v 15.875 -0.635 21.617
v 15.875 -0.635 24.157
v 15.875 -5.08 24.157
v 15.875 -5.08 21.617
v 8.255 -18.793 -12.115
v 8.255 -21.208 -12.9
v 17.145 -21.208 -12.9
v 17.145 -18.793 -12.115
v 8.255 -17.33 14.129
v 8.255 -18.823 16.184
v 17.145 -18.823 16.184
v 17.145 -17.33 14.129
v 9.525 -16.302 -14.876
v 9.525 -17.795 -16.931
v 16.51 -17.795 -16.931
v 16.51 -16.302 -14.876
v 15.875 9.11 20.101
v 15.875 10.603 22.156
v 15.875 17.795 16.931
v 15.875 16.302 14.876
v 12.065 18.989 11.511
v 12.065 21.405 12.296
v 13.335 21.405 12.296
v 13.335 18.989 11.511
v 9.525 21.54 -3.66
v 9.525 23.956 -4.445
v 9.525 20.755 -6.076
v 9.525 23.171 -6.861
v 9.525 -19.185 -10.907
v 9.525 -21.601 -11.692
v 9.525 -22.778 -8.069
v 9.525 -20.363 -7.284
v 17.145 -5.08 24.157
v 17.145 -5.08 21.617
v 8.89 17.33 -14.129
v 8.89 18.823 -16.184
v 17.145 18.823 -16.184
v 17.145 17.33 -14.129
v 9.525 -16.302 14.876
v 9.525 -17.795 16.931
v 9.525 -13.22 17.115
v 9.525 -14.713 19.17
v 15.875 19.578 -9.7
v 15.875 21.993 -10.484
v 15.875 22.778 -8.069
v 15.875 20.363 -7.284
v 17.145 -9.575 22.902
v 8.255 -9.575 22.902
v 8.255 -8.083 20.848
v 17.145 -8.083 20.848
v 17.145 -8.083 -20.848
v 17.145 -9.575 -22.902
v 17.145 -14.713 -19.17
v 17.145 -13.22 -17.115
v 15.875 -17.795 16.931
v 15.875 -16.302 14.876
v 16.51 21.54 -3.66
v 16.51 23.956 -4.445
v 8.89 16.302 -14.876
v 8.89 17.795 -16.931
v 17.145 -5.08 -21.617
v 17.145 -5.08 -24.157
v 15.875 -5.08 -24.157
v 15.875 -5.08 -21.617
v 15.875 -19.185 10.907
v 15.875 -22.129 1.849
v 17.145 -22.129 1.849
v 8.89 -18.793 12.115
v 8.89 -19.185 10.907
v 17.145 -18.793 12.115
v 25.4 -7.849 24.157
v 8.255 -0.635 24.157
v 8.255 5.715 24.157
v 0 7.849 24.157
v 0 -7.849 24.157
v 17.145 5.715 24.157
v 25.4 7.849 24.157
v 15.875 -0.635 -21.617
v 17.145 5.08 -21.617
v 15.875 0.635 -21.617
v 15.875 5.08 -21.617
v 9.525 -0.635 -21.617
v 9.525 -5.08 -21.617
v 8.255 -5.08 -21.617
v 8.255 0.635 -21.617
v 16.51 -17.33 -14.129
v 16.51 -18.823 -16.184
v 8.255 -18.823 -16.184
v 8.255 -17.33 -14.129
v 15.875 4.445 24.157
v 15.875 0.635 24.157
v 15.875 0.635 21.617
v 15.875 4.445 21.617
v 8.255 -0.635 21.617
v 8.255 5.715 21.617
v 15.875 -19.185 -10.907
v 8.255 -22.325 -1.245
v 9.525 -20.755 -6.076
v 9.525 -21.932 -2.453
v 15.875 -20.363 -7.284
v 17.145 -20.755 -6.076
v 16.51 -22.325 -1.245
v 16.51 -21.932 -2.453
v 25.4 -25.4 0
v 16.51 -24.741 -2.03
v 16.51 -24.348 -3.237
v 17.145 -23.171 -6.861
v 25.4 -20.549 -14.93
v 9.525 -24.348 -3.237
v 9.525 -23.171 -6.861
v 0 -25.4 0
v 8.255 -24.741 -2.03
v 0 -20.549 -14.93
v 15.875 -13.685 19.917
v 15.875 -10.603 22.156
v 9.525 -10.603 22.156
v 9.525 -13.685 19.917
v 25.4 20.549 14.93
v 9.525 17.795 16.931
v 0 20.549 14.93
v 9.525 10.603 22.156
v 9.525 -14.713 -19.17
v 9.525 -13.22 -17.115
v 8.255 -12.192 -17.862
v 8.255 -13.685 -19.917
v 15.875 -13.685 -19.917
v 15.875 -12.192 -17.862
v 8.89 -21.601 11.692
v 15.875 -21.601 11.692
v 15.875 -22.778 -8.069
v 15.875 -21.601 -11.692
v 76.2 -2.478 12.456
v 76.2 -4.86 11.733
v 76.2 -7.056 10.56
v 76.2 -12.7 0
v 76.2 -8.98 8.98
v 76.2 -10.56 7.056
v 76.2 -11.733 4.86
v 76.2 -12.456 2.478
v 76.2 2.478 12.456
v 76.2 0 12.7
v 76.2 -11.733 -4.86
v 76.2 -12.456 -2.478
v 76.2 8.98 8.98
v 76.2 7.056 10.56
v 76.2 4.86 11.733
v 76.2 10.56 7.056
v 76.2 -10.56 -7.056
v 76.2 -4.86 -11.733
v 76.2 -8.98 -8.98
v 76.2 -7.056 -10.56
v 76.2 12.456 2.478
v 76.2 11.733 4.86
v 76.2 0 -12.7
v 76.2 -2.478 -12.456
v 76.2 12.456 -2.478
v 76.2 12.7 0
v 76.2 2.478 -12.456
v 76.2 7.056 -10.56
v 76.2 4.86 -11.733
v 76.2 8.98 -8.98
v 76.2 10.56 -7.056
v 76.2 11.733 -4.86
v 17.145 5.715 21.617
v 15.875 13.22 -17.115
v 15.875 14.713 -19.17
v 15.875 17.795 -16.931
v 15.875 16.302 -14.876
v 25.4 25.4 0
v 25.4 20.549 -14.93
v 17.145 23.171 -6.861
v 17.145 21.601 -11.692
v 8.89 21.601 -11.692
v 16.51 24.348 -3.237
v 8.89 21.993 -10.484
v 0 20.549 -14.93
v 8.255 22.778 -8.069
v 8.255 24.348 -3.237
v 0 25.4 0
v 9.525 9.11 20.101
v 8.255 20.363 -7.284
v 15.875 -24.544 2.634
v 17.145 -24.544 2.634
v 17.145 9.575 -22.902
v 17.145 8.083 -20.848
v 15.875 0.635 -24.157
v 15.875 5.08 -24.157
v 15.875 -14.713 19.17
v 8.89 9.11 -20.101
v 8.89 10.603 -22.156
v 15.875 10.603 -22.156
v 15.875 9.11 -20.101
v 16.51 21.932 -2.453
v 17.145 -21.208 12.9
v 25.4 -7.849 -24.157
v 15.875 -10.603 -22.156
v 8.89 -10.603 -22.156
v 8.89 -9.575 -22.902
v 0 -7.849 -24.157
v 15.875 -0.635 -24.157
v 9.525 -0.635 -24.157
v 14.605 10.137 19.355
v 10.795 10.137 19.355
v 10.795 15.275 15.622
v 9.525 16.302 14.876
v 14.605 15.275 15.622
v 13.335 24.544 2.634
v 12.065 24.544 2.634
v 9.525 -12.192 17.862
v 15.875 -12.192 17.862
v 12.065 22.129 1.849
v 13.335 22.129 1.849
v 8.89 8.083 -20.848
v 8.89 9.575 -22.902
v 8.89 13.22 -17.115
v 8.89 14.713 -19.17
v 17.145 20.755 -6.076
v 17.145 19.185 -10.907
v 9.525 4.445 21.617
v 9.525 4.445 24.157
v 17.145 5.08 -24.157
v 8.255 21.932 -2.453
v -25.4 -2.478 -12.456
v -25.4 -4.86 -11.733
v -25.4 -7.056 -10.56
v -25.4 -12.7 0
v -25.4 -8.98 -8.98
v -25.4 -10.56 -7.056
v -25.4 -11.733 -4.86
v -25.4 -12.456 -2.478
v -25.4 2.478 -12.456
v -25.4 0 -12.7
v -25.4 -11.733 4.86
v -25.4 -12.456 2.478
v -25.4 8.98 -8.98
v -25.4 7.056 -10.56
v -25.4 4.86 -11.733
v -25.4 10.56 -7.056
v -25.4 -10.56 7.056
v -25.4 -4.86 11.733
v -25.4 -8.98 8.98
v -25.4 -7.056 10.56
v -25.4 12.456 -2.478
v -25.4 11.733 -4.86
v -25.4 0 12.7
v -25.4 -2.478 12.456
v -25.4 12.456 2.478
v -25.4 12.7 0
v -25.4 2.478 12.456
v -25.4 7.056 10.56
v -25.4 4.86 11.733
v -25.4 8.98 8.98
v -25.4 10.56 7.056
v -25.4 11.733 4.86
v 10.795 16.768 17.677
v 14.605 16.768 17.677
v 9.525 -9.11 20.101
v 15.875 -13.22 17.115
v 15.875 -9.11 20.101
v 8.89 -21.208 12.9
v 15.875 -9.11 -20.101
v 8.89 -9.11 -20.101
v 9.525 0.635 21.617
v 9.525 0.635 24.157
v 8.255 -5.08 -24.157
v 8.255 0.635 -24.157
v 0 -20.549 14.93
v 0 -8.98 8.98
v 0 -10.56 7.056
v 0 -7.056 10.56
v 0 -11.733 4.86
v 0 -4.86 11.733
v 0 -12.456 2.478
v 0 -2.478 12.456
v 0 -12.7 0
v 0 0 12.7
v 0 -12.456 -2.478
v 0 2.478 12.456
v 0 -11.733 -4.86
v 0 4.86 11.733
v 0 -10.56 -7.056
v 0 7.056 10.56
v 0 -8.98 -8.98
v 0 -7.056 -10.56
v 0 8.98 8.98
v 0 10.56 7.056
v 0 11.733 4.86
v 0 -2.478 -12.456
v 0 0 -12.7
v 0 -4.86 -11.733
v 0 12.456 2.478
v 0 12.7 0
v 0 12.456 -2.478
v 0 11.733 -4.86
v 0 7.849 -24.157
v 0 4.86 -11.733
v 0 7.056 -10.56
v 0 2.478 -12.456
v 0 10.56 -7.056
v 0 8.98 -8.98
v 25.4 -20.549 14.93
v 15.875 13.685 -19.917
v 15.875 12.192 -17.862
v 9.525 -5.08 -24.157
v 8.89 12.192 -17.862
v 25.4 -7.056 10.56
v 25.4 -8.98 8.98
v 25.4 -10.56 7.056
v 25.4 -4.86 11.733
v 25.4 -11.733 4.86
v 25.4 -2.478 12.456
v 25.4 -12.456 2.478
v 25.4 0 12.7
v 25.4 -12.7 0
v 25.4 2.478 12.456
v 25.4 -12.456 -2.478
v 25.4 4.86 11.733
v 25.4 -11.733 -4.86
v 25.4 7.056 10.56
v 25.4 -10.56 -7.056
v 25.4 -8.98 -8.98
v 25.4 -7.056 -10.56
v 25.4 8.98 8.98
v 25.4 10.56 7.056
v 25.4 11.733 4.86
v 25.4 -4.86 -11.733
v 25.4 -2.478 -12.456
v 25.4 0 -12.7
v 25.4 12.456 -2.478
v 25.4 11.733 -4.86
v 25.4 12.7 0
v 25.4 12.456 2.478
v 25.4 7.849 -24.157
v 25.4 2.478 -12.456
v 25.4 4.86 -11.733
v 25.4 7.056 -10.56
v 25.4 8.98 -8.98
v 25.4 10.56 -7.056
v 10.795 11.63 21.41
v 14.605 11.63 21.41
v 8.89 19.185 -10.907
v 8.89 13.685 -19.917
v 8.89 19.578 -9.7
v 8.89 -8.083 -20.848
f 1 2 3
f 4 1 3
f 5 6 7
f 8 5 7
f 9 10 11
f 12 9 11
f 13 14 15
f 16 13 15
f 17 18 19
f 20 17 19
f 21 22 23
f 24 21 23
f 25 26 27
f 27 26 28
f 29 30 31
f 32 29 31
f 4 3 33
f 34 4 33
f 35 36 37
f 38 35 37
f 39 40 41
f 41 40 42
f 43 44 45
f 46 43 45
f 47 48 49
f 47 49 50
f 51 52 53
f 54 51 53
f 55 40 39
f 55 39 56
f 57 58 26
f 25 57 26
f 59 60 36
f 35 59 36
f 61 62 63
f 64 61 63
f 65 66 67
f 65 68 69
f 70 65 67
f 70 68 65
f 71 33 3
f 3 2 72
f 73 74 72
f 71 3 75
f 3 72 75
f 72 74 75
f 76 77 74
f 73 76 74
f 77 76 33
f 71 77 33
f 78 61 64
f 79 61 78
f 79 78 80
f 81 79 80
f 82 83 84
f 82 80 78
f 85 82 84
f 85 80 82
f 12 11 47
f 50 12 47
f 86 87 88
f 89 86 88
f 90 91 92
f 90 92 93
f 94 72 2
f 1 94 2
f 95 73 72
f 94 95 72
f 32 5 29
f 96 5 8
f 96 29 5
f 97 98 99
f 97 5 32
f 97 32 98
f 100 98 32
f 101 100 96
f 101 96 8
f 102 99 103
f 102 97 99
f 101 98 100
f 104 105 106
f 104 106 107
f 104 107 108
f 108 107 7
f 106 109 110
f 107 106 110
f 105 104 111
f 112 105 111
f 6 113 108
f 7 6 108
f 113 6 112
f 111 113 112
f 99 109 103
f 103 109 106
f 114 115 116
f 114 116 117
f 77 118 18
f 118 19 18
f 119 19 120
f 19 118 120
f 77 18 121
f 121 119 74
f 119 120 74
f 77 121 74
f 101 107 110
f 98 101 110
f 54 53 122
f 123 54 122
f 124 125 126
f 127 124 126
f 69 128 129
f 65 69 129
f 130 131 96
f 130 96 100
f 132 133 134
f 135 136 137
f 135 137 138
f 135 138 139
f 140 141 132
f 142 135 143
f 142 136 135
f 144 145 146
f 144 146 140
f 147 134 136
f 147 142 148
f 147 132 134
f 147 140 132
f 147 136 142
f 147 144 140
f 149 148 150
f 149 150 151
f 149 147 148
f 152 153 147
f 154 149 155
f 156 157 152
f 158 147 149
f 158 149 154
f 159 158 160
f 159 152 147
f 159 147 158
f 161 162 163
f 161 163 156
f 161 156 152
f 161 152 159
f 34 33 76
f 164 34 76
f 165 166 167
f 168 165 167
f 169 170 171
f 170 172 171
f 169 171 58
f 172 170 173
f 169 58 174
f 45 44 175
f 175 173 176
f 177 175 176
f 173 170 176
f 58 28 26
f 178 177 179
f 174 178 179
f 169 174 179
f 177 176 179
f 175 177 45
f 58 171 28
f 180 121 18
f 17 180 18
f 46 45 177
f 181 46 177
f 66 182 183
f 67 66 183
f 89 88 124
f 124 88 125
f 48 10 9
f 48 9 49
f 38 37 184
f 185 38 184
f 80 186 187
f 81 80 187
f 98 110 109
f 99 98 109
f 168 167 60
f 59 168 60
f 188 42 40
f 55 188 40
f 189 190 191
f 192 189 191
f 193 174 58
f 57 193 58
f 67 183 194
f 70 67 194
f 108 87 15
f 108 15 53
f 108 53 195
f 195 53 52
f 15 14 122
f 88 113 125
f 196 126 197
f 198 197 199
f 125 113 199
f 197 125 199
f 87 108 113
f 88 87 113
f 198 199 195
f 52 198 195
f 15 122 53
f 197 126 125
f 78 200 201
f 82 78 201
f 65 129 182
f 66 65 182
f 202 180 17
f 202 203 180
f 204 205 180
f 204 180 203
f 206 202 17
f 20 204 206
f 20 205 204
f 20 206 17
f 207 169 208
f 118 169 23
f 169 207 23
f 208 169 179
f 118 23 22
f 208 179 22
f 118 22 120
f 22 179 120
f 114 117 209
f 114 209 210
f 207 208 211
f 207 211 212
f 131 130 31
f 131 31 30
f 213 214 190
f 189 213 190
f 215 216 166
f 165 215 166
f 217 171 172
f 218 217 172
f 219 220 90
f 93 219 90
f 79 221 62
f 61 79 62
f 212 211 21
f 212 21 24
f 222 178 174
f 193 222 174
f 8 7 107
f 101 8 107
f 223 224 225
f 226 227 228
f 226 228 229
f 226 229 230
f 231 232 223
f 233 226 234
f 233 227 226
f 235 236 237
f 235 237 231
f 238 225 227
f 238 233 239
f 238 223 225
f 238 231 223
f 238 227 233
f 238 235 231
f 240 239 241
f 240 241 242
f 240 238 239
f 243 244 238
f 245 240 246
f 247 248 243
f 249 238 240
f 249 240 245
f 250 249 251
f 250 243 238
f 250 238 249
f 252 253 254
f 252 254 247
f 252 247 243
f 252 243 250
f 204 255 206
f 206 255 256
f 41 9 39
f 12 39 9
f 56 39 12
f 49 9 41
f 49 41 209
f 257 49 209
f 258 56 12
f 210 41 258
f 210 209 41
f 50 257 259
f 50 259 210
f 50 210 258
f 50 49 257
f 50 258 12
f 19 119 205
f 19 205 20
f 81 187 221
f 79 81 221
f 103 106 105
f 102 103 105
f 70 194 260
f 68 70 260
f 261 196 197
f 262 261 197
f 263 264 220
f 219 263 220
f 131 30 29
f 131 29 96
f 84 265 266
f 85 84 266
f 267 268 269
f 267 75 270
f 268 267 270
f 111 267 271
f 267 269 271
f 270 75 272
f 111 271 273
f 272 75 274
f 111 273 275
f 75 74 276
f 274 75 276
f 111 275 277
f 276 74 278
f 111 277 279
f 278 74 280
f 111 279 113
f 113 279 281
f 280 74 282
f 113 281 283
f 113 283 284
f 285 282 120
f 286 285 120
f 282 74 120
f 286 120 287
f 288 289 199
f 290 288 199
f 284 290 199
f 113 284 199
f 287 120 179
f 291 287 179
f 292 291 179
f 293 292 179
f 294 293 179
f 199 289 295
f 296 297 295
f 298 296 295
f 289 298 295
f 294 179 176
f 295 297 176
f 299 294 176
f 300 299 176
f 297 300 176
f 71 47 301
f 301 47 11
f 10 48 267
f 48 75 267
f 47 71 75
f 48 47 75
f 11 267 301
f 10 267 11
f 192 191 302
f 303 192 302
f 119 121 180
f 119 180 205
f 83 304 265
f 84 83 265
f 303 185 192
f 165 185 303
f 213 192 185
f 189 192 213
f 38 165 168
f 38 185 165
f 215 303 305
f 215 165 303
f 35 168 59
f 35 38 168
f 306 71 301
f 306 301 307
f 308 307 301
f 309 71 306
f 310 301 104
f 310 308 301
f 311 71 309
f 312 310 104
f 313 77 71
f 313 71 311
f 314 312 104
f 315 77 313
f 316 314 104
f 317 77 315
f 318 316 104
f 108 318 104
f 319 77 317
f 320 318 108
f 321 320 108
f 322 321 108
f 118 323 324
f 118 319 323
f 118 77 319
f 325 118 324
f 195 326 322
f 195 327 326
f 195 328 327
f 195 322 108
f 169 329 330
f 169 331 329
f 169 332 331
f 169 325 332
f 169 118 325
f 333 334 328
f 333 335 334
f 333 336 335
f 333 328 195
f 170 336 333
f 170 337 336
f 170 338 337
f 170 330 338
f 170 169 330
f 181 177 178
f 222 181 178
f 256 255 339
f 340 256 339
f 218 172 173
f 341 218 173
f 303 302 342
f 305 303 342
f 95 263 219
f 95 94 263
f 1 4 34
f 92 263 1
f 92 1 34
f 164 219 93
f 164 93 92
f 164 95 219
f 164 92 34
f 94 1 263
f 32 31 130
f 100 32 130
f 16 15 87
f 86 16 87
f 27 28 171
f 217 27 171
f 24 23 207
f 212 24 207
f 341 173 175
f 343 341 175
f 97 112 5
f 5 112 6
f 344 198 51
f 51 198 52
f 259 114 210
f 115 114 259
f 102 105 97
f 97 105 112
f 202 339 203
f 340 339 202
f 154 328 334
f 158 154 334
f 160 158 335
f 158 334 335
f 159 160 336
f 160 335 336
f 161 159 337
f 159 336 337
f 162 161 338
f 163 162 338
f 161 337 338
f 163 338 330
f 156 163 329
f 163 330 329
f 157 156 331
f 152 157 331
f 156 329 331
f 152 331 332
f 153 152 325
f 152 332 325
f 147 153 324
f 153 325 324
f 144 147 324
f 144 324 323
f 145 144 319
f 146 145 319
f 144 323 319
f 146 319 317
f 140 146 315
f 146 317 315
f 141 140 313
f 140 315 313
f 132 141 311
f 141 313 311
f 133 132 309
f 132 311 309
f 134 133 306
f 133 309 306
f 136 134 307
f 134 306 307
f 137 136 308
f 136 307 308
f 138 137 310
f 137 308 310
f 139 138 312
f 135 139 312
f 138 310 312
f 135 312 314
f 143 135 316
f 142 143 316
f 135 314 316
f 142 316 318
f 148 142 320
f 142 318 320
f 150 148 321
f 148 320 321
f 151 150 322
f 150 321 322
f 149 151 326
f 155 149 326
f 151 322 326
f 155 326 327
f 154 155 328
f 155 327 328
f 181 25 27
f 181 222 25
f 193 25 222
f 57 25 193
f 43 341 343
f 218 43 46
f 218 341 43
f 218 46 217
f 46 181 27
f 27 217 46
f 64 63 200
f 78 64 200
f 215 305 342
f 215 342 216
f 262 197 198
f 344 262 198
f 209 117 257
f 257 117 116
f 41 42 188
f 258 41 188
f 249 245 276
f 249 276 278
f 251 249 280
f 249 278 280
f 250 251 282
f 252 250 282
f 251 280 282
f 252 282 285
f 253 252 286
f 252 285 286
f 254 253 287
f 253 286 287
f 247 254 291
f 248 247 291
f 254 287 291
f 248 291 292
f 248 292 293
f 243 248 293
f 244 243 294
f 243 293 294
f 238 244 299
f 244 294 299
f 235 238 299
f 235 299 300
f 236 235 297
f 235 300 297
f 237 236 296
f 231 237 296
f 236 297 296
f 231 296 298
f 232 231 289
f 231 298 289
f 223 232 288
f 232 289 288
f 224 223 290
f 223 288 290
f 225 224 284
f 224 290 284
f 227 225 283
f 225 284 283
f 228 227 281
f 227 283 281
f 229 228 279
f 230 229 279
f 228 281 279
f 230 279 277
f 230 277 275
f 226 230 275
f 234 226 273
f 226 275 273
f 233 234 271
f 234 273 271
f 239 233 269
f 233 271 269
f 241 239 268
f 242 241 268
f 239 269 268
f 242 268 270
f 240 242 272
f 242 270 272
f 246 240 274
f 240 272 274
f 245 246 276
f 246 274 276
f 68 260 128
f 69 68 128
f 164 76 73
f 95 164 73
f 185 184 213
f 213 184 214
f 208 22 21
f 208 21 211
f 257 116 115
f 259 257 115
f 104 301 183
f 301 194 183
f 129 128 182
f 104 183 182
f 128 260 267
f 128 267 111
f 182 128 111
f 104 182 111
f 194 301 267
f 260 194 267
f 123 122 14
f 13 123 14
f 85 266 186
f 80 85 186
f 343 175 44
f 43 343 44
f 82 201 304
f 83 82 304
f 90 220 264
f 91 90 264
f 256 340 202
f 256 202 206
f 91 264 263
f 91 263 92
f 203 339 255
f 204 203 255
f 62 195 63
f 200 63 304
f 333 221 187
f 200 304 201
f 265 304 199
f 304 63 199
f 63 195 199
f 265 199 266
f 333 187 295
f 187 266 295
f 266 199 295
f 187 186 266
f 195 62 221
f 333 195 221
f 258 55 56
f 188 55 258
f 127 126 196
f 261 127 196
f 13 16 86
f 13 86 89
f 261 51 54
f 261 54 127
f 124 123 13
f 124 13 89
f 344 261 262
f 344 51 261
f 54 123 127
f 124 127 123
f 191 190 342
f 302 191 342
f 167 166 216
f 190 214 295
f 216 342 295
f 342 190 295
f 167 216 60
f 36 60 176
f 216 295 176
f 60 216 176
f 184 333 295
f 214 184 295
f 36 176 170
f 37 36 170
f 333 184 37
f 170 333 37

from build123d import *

# Parameters (mm, degrees)
BOSS_EXTRUDE1_DEPTH      = 25.4
SKETCH2_R                = 12.7
BOSS_EXTRUDE2_DEPTH      = 50.8
SKETCH3_R                = 12.7
BOSS_EXTRUDE3_DEPTH      = 25.4
SKETCH4_W                = 6.35
SKETCH4_H                = 8.89
SKETCH4_W_2              = 3.81
SKETCH4_H_2              = 6.35
CUT_EXTRUDE1_DEPTH       = 2.54
SKETCH5_W                = 1.27
SKETCH5_H                = 10.16
CUT_EXTRUDE2_DEPTH       = 2.54
CUT_EXTRUDE3_DEPTH       = 2.54
CUT_EXTRUDE4_DEPTH       = 2.54
CUT_EXTRUDE5_DEPTH       = 2.54
CUT_EXTRUDE6_DEPTH       = 2.54
SKETCH11_W               = 6.35
SKETCH11_H               = 3.81
CUT_EXTRUDE7_DEPTH       = 8.464872704
CUT_EXTRUDE7_DEPTH_BACK  = 2.54
CUT_EXTRUDE8_DEPTH       = 2.54
SKETCH13_W               = 8.89
SKETCH13_H               = 11.43
SKETCH13_W_2             = 6.35
SKETCH13_H_2             = 3.81
CUT_EXTRUDE9_DEPTH       = 2.54
SKETCH14_W               = 6.35
SKETCH14_H               = 3.81
CUT_EXTRUDE10_DEPTH      = 1
CUT_EXTRUDE10_DEPTH_BACK = 2.54


with BuildPart() as part:
    # Sketch1 → Boss-Extrude1 (new body)
    with BuildSketch(Plane(origin=(0, 0, 0), x_dir=(0, 0, -1), z_dir=(1, 0, 0))):
        Polygon((0, 25.4), (-14.929745408, 20.549031657), (-24.156835514, 7.849031657), (-24.156835514, -7.849031657), (-14.929745408, -20.549031657), (0, -25.4), (14.929745408, -20.549031657), (24.156835514, -7.849031657), (24.156835514, 7.849031657), (14.929745408, 20.549031657), align=None)
    extrude(amount=BOSS_EXTRUDE1_DEPTH)

    # Sketch2 → Boss-Extrude2 (add)
    with BuildSketch(Plane(origin=(25.4, 0, 0), x_dir=(0, 0, -1), z_dir=(1, 0, 0))):
        Circle(SKETCH2_R)
    extrude(amount=BOSS_EXTRUDE2_DEPTH)

    # Sketch3 → Boss-Extrude3 (add)
    with BuildSketch(Plane.ZY):
        Circle(SKETCH3_R)
    extrude(amount=BOSS_EXTRUDE3_DEPTH)

    # Sketch4 → Cut-Extrude1 (cut)
    with BuildSketch(Plane(origin=(0, 14.199031657, 19.543290461), x_dir=(1, 0, 0), z_dir=(0, 0.587785252, 0.809016994))):
        with Locations((12.7, 0)):
            Rectangle(SKETCH4_W, SKETCH4_H)
        with Locations((12.7, 0)):
            Rectangle(SKETCH4_W_2, SKETCH4_H_2, mode=Mode.SUBTRACT)
    extrude(amount=-CUT_EXTRUDE1_DEPTH, mode=Mode.SUBTRACT)

    # Sketch5 → Cut-Extrude2 (cut)
    with BuildSketch(Plane(origin=(0, 22.974515829, 7.464872704), x_dir=(1, 0, 0), z_dir=(0, 0.951056516, 0.309016994))):
        with Locations((12.7, 0)):
            Rectangle(SKETCH5_W, SKETCH5_H)
    extrude(amount=-CUT_EXTRUDE2_DEPTH, mode=Mode.SUBTRACT)

    # Sketch6 → Cut-Extrude3 (cut)
    with BuildSketch(Plane(origin=(0, 22.974515829, -7.464872704), x_dir=(1, 0, 0), z_dir=(0, 0.951056516, -0.309016994))):
        Polygon((8.89, 3.175), (15.875, 3.175), (15.875, 0.635), (8.255, 0.635), (8.255, -4.445), (16.51, -4.445), (16.51, -3.175), (9.525, -3.175), (9.525, -0.635), (17.145, -0.635), (17.145, 4.445), (8.89, 4.445), align=None)
    extrude(amount=-CUT_EXTRUDE3_DEPTH, mode=Mode.SUBTRACT)

    # Sketch8 → Cut-Extrude4 (cut)
    with BuildSketch(Plane(origin=(0, 14.199031657, -19.543290461), x_dir=(-1, 0, 0), z_dir=(0, 0.587785252, -0.809016994))):
        Polygon((-8.89, -5.715), (-8.89, -4.445), (-15.875, -4.445), (-15.875, -0.635), (-8.89, -0.635), (-8.89, 0.635), (-15.875, 0.635), (-15.875, 4.445), (-8.89, 4.445), (-8.89, 5.715), (-17.145, 5.715), (-17.145, -5.715), align=None)
    extrude(amount=-CUT_EXTRUDE4_DEPTH, mode=Mode.SUBTRACT)

    # Sketch9 → Cut-Extrude5 (cut)
    with BuildSketch(Plane(origin=(0, 0, -24.156835514), x_dir=(-1, 0, 0), z_dir=(0, 0, -1))):
        Polygon((-9.525, -5.08), (-8.255, -5.08), (-8.255, 0.635), (-15.875, 0.635), (-15.875, 5.08), (-17.145, 5.08), (-17.145, -5.08), (-15.875, -5.08), (-15.875, -0.635), (-9.525, -0.635), align=None)
    extrude(amount=-CUT_EXTRUDE5_DEPTH, mode=Mode.SUBTRACT)

    # Sketch10 → Cut-Extrude6 (cut)
    with BuildSketch(Plane(origin=(0, -14.199031657, -19.543290461), x_dir=(-1, 0, 0), z_dir=(0, -0.587785252, -0.809016994))):
        Polygon((-8.89, 5.715), (-17.145, 5.715), (-17.145, -0.635), (-9.525, -0.635), (-9.525, -4.445), (-16.51, -4.445), (-16.51, -5.715), (-8.255, -5.715), (-8.255, 0.635), (-15.875, 0.635), (-15.875, 4.445), (-8.89, 4.445), align=None)
    extrude(amount=-CUT_EXTRUDE6_DEPTH, mode=Mode.SUBTRACT)

    # Sketch11 → Cut-Extrude7 (cut, two sides)
    with BuildSketch(Plane(origin=(0, -22.974515829, -7.464872704), x_dir=(1, 0, 0), z_dir=(0, -0.951056516, -0.309016994))) as cut_extrude7_sk:
        Polygon((17.145, 0.635), (9.525, 0.635), (9.525, 4.445), (16.51, 4.445), (16.51, 5.715), (8.255, 5.715), (8.255, -5.715), (17.145, -5.715), align=None)
        with Locations((12.7, -2.54)):
            Rectangle(SKETCH11_W, SKETCH11_H, mode=Mode.SUBTRACT)
    extrude(amount=CUT_EXTRUDE7_DEPTH, mode=Mode.SUBTRACT)
    extrude(cut_extrude7_sk.sketch, amount=-CUT_EXTRUDE7_DEPTH_BACK, mode=Mode.SUBTRACT)

    # Sketch12 → Cut-Extrude8 (cut)
    with BuildSketch(Plane(origin=(0, -22.974515829, 7.464872704), x_dir=(1, 0, 0), z_dir=(0, -0.951056516, 0.309016994))):
        Polygon((8.89, 4.445), (15.875, 4.445), (15.875, -5.08), (17.145, -5.08), (17.145, 5.715), (8.89, 5.715), align=None)
    extrude(amount=-CUT_EXTRUDE8_DEPTH, mode=Mode.SUBTRACT)

    # Sketch13 → Cut-Extrude9 (cut)
    with BuildSketch(Plane(origin=(0, -14.199031657, 19.543290461), x_dir=(1, 0, 0), z_dir=(0, -0.587785252, 0.809016994))):
        with Locations((12.7, 0)):
            Rectangle(SKETCH13_W, SKETCH13_H)
        with Locations((12.7, -2.54)):
            Rectangle(SKETCH13_W_2, SKETCH13_H_2, mode=Mode.SUBTRACT)
        with Locations((12.7, 2.54)):
            Rectangle(SKETCH13_W_2, SKETCH13_H_2, mode=Mode.SUBTRACT)
    extrude(amount=-CUT_EXTRUDE9_DEPTH, mode=Mode.SUBTRACT)

    # Sketch14 → Cut-Extrude10 (cut, two sides)
    with BuildSketch(Plane.XY.offset(24.156835514)) as cut_extrude10_sk:
        Polygon((15.875, -0.635), (15.875, -5.08), (17.145, -5.08), (17.145, 5.715), (8.255, 5.715), (8.255, -0.635), align=None)
        with Locations((12.7, 2.54)):
            Rectangle(SKETCH14_W, SKETCH14_H, mode=Mode.SUBTRACT)
    extrude(amount=CUT_EXTRUDE10_DEPTH, mode=Mode.SUBTRACT)
    extrude(cut_extrude10_sk.sketch, amount=-CUT_EXTRUDE10_DEPTH_BACK, mode=Mode.SUBTRACT)


solid = part.part
